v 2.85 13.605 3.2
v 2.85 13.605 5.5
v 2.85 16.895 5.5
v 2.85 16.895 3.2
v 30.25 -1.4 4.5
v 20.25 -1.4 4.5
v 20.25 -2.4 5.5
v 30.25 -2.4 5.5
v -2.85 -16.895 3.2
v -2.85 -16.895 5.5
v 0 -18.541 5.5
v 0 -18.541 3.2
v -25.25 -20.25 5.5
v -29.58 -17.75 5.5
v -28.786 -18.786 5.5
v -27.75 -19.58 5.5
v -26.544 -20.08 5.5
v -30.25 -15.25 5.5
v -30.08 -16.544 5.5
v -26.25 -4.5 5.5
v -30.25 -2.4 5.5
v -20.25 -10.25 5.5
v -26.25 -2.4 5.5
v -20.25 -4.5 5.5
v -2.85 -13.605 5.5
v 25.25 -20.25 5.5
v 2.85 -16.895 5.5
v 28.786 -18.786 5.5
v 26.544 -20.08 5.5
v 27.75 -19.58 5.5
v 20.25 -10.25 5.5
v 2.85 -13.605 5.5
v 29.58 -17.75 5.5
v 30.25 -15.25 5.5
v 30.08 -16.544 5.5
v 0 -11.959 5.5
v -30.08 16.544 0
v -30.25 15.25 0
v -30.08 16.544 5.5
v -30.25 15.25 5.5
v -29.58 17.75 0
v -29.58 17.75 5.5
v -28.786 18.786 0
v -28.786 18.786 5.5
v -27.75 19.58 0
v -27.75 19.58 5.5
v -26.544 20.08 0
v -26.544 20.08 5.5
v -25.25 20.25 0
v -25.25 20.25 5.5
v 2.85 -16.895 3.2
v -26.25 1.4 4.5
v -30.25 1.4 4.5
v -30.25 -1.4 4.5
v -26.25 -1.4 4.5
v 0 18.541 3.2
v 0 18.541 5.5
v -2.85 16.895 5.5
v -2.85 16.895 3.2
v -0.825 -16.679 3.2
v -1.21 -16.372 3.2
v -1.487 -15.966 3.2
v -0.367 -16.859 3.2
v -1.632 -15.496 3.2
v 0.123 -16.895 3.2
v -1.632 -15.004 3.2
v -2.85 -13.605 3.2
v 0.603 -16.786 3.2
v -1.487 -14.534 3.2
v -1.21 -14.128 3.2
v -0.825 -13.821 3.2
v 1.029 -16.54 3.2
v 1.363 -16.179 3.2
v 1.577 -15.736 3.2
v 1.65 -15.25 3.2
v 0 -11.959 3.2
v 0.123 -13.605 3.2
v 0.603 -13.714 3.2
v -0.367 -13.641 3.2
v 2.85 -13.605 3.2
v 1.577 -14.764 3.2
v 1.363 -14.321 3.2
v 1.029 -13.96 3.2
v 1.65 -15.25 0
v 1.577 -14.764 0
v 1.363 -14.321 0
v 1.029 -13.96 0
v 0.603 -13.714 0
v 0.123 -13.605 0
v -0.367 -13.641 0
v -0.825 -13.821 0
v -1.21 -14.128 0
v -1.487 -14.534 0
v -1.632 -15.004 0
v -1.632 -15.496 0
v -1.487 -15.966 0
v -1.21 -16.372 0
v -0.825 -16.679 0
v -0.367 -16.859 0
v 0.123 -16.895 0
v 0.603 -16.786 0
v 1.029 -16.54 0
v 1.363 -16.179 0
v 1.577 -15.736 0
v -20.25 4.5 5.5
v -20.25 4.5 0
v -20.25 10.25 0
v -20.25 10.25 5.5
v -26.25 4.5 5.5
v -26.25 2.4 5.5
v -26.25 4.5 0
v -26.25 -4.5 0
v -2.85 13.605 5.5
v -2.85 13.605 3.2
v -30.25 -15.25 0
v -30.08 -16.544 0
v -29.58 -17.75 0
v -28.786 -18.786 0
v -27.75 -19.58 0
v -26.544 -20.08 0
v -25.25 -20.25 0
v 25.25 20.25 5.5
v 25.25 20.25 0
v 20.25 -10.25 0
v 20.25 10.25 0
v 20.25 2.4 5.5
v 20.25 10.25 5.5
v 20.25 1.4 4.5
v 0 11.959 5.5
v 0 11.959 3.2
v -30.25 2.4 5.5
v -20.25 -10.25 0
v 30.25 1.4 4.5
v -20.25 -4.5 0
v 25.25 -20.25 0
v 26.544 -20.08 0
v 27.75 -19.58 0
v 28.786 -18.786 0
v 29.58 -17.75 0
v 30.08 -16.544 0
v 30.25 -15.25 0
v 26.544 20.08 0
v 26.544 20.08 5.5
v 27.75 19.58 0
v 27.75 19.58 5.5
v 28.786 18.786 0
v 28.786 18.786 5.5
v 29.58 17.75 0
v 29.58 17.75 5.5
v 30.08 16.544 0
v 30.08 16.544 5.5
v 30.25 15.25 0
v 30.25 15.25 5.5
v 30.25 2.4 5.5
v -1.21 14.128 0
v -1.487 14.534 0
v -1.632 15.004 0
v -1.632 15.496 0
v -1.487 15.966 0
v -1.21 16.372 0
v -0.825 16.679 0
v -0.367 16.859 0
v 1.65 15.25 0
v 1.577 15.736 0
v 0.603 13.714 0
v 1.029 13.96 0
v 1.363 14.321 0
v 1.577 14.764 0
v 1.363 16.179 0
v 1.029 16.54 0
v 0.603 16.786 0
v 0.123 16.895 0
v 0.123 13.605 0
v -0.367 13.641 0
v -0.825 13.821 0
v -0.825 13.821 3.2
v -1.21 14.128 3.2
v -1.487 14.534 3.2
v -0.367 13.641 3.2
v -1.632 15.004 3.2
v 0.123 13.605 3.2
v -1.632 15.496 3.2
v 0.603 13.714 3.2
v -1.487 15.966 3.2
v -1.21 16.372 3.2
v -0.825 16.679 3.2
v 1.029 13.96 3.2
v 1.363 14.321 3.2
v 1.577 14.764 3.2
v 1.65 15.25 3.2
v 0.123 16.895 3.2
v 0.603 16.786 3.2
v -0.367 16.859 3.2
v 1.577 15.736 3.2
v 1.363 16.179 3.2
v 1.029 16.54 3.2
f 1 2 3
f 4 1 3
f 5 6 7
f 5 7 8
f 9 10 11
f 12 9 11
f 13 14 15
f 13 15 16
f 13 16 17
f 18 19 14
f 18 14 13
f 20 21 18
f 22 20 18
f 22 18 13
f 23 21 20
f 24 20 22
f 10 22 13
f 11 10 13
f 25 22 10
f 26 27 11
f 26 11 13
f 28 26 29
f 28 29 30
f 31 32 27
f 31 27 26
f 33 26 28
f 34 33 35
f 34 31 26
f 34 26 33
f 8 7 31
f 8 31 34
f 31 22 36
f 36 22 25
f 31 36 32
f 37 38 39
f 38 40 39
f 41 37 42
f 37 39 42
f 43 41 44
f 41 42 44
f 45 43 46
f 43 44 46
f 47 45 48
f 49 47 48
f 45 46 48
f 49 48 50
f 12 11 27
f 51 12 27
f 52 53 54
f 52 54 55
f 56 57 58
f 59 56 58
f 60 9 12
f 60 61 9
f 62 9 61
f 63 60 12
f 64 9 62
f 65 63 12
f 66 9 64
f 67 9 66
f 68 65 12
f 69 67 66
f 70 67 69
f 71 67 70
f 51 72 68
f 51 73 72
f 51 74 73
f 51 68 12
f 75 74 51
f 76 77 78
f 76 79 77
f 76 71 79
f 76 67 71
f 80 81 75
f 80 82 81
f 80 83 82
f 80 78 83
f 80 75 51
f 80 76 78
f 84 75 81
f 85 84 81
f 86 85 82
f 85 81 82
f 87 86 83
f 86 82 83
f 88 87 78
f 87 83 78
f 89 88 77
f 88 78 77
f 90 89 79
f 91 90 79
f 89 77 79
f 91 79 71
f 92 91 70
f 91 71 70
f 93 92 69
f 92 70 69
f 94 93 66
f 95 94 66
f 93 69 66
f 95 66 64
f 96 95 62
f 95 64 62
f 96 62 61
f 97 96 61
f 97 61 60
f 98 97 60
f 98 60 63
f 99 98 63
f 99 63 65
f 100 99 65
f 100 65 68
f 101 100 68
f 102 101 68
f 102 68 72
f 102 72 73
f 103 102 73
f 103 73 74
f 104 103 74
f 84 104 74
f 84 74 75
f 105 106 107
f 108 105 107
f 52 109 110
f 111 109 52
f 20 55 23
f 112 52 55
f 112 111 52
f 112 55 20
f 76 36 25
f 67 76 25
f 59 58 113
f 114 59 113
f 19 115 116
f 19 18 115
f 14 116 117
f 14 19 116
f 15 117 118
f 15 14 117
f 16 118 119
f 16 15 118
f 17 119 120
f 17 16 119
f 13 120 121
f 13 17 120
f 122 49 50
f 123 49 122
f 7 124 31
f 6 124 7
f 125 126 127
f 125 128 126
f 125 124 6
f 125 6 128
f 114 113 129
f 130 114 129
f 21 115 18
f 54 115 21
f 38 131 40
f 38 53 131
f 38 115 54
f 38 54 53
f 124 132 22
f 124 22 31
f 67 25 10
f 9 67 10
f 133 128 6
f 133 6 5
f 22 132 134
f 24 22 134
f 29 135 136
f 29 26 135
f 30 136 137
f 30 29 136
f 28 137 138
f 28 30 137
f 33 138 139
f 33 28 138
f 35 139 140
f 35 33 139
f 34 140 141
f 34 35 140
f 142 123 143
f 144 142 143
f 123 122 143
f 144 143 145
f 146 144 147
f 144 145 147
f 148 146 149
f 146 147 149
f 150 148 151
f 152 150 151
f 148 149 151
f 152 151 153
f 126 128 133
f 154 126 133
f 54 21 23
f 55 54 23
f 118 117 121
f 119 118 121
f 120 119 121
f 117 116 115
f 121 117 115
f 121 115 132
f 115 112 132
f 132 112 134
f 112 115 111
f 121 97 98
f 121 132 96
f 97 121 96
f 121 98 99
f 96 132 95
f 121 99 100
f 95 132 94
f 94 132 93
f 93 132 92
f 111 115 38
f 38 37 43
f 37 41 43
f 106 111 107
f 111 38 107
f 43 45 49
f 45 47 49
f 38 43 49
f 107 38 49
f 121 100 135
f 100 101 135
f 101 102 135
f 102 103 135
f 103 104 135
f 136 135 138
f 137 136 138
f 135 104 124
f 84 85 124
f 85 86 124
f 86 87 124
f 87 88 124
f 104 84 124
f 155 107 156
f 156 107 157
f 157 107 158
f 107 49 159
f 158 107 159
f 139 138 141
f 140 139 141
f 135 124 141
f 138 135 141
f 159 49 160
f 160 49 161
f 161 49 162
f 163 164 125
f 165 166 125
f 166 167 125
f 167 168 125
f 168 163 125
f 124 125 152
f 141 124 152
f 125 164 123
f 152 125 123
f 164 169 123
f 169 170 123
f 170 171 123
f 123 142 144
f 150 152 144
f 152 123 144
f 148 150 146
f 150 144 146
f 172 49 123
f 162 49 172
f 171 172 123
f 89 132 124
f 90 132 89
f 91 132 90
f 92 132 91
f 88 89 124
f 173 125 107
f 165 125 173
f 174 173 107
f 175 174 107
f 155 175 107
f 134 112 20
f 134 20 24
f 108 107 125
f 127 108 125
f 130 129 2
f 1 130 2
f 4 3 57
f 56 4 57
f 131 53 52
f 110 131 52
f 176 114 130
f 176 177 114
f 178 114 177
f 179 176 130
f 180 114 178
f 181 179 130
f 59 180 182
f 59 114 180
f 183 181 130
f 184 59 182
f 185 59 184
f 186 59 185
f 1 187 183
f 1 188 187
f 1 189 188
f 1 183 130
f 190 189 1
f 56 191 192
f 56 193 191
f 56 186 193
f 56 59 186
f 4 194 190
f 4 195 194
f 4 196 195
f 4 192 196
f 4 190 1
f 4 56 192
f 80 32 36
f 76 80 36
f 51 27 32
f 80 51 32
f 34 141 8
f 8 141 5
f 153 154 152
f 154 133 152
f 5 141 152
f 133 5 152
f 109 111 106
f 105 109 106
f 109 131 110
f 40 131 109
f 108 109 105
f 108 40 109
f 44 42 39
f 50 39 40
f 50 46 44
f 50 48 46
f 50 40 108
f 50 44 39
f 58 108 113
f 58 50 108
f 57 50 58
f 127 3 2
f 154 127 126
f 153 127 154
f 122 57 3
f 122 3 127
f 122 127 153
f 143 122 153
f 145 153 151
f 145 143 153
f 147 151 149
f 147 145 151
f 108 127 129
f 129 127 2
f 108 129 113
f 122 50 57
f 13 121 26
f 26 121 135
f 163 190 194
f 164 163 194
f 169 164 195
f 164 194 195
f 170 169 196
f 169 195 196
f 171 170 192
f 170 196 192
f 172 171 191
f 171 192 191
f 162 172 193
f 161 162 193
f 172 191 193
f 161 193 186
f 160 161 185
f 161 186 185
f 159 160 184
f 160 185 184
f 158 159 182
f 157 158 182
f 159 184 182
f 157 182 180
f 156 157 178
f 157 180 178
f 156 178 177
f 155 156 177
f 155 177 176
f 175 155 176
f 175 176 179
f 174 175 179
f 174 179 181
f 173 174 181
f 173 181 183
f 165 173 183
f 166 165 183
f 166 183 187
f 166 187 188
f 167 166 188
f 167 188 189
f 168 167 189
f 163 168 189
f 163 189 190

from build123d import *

# Parameters (mm, degrees)
F0_W     = 60.5
F0_H     = 40.5
F0_W_2   = 40.5
F0_H_2   = 20.5
F1_DEPTH = 5.5
F2_W     = 10
F2_H     = 2.8
F3_DEPTH = 1
F4_R     = 1.65
F5_DEPTH = 25
F6_W     = 6
F6_H     = 9
F7_DEPTH = 25
F9_DEPTH = 2.3
F10_SIZE = 0.99999
F11_R    = 5


# Not quite as in the source:
# - a fillet or chamfer is up to 0.001 mm smaller than in the source, because OpenCascade refuses the exact size


with BuildPart() as f1:
    # F0 (on Top) → F1 (new body)
    with BuildSketch(Plane.XY):
        Rectangle(F0_W, F0_H)
        Rectangle(F0_W_2, F0_H_2, mode=Mode.SUBTRACT)
    extrude(amount=F1_DEPTH)

    # F2 (on face) → F3 (cut)
    with BuildSketch(Plane.XY.offset(5.5)):
        with Locations((-25.25, 0)):
            Rectangle(F2_W, F2_H)
        with Locations((25.25, 0)):
            Rectangle(F2_W, F2_H)
    extrude(amount=-F3_DEPTH, mode=Mode.SUBTRACT)

    # F4 (on face) → F5 (cut)
    with BuildSketch(Plane.XY.offset(5.5)):
        with Locations((0, 15.25)):
            Circle(F4_R)
        with Locations((0, -15.25)):
            Circle(F4_R)
    extrude(amount=-F5_DEPTH, mode=Mode.SUBTRACT)

    # F6 (on face) → F7 (cut)
    with BuildSketch(Plane(origin=(0, 0, 0), x_dir=(1, 0, 0), z_dir=(0, 0, -1))):
        with Locations((-23.25, 0)):
            Rectangle(F6_W, F6_H)
    extrude(amount=-F7_DEPTH, mode=Mode.SUBTRACT)

    # F8 (on face) → F9 (cut)
    with BuildSketch(Plane.XY.offset(5.5)):
        Polygon((2.85, 13.6045517328), (2.85, 16.8954482672), (0, 18.5408965344), (-2.85, 16.8954482672), (-2.85, 13.6045517328), (0, 11.9591034656), align=None)
        Polygon((-2.85, -16.8954482672), (0, -18.5408965344), (2.85, -16.8954482672), (2.85, -13.6045517328), (0, -11.9591034656), (-2.85, -13.6045517328), align=None)
    extrude(amount=-F9_DEPTH, mode=Mode.SUBTRACT)

    # F10 (size 1 in the source; OpenCascade refuses exactly that, so slightly less here)
    f10_edges = [f1.edges().sort_by_distance(p)[0] for p in [
        (25.25, 1.4, 5.5),
        (25.25, -1.4, 5.5),
        (-28.25, 1.4, 5.5),
        (-28.25, -1.4, 5.5),
    ]]
    chamfer(f10_edges, length=F10_SIZE)

    # F11
    f11_edges = [f1.edges().sort_by_distance(p)[0] for p in [
        (30.25, 20.25, 2.75),
        (30.25, -20.25, 2.75),
        (-30.25, -20.25, 2.75),
        (-30.25, 20.25, 2.75),
    ]]
    fillet(f11_edges, radius=F11_R)


solid = f1.part
